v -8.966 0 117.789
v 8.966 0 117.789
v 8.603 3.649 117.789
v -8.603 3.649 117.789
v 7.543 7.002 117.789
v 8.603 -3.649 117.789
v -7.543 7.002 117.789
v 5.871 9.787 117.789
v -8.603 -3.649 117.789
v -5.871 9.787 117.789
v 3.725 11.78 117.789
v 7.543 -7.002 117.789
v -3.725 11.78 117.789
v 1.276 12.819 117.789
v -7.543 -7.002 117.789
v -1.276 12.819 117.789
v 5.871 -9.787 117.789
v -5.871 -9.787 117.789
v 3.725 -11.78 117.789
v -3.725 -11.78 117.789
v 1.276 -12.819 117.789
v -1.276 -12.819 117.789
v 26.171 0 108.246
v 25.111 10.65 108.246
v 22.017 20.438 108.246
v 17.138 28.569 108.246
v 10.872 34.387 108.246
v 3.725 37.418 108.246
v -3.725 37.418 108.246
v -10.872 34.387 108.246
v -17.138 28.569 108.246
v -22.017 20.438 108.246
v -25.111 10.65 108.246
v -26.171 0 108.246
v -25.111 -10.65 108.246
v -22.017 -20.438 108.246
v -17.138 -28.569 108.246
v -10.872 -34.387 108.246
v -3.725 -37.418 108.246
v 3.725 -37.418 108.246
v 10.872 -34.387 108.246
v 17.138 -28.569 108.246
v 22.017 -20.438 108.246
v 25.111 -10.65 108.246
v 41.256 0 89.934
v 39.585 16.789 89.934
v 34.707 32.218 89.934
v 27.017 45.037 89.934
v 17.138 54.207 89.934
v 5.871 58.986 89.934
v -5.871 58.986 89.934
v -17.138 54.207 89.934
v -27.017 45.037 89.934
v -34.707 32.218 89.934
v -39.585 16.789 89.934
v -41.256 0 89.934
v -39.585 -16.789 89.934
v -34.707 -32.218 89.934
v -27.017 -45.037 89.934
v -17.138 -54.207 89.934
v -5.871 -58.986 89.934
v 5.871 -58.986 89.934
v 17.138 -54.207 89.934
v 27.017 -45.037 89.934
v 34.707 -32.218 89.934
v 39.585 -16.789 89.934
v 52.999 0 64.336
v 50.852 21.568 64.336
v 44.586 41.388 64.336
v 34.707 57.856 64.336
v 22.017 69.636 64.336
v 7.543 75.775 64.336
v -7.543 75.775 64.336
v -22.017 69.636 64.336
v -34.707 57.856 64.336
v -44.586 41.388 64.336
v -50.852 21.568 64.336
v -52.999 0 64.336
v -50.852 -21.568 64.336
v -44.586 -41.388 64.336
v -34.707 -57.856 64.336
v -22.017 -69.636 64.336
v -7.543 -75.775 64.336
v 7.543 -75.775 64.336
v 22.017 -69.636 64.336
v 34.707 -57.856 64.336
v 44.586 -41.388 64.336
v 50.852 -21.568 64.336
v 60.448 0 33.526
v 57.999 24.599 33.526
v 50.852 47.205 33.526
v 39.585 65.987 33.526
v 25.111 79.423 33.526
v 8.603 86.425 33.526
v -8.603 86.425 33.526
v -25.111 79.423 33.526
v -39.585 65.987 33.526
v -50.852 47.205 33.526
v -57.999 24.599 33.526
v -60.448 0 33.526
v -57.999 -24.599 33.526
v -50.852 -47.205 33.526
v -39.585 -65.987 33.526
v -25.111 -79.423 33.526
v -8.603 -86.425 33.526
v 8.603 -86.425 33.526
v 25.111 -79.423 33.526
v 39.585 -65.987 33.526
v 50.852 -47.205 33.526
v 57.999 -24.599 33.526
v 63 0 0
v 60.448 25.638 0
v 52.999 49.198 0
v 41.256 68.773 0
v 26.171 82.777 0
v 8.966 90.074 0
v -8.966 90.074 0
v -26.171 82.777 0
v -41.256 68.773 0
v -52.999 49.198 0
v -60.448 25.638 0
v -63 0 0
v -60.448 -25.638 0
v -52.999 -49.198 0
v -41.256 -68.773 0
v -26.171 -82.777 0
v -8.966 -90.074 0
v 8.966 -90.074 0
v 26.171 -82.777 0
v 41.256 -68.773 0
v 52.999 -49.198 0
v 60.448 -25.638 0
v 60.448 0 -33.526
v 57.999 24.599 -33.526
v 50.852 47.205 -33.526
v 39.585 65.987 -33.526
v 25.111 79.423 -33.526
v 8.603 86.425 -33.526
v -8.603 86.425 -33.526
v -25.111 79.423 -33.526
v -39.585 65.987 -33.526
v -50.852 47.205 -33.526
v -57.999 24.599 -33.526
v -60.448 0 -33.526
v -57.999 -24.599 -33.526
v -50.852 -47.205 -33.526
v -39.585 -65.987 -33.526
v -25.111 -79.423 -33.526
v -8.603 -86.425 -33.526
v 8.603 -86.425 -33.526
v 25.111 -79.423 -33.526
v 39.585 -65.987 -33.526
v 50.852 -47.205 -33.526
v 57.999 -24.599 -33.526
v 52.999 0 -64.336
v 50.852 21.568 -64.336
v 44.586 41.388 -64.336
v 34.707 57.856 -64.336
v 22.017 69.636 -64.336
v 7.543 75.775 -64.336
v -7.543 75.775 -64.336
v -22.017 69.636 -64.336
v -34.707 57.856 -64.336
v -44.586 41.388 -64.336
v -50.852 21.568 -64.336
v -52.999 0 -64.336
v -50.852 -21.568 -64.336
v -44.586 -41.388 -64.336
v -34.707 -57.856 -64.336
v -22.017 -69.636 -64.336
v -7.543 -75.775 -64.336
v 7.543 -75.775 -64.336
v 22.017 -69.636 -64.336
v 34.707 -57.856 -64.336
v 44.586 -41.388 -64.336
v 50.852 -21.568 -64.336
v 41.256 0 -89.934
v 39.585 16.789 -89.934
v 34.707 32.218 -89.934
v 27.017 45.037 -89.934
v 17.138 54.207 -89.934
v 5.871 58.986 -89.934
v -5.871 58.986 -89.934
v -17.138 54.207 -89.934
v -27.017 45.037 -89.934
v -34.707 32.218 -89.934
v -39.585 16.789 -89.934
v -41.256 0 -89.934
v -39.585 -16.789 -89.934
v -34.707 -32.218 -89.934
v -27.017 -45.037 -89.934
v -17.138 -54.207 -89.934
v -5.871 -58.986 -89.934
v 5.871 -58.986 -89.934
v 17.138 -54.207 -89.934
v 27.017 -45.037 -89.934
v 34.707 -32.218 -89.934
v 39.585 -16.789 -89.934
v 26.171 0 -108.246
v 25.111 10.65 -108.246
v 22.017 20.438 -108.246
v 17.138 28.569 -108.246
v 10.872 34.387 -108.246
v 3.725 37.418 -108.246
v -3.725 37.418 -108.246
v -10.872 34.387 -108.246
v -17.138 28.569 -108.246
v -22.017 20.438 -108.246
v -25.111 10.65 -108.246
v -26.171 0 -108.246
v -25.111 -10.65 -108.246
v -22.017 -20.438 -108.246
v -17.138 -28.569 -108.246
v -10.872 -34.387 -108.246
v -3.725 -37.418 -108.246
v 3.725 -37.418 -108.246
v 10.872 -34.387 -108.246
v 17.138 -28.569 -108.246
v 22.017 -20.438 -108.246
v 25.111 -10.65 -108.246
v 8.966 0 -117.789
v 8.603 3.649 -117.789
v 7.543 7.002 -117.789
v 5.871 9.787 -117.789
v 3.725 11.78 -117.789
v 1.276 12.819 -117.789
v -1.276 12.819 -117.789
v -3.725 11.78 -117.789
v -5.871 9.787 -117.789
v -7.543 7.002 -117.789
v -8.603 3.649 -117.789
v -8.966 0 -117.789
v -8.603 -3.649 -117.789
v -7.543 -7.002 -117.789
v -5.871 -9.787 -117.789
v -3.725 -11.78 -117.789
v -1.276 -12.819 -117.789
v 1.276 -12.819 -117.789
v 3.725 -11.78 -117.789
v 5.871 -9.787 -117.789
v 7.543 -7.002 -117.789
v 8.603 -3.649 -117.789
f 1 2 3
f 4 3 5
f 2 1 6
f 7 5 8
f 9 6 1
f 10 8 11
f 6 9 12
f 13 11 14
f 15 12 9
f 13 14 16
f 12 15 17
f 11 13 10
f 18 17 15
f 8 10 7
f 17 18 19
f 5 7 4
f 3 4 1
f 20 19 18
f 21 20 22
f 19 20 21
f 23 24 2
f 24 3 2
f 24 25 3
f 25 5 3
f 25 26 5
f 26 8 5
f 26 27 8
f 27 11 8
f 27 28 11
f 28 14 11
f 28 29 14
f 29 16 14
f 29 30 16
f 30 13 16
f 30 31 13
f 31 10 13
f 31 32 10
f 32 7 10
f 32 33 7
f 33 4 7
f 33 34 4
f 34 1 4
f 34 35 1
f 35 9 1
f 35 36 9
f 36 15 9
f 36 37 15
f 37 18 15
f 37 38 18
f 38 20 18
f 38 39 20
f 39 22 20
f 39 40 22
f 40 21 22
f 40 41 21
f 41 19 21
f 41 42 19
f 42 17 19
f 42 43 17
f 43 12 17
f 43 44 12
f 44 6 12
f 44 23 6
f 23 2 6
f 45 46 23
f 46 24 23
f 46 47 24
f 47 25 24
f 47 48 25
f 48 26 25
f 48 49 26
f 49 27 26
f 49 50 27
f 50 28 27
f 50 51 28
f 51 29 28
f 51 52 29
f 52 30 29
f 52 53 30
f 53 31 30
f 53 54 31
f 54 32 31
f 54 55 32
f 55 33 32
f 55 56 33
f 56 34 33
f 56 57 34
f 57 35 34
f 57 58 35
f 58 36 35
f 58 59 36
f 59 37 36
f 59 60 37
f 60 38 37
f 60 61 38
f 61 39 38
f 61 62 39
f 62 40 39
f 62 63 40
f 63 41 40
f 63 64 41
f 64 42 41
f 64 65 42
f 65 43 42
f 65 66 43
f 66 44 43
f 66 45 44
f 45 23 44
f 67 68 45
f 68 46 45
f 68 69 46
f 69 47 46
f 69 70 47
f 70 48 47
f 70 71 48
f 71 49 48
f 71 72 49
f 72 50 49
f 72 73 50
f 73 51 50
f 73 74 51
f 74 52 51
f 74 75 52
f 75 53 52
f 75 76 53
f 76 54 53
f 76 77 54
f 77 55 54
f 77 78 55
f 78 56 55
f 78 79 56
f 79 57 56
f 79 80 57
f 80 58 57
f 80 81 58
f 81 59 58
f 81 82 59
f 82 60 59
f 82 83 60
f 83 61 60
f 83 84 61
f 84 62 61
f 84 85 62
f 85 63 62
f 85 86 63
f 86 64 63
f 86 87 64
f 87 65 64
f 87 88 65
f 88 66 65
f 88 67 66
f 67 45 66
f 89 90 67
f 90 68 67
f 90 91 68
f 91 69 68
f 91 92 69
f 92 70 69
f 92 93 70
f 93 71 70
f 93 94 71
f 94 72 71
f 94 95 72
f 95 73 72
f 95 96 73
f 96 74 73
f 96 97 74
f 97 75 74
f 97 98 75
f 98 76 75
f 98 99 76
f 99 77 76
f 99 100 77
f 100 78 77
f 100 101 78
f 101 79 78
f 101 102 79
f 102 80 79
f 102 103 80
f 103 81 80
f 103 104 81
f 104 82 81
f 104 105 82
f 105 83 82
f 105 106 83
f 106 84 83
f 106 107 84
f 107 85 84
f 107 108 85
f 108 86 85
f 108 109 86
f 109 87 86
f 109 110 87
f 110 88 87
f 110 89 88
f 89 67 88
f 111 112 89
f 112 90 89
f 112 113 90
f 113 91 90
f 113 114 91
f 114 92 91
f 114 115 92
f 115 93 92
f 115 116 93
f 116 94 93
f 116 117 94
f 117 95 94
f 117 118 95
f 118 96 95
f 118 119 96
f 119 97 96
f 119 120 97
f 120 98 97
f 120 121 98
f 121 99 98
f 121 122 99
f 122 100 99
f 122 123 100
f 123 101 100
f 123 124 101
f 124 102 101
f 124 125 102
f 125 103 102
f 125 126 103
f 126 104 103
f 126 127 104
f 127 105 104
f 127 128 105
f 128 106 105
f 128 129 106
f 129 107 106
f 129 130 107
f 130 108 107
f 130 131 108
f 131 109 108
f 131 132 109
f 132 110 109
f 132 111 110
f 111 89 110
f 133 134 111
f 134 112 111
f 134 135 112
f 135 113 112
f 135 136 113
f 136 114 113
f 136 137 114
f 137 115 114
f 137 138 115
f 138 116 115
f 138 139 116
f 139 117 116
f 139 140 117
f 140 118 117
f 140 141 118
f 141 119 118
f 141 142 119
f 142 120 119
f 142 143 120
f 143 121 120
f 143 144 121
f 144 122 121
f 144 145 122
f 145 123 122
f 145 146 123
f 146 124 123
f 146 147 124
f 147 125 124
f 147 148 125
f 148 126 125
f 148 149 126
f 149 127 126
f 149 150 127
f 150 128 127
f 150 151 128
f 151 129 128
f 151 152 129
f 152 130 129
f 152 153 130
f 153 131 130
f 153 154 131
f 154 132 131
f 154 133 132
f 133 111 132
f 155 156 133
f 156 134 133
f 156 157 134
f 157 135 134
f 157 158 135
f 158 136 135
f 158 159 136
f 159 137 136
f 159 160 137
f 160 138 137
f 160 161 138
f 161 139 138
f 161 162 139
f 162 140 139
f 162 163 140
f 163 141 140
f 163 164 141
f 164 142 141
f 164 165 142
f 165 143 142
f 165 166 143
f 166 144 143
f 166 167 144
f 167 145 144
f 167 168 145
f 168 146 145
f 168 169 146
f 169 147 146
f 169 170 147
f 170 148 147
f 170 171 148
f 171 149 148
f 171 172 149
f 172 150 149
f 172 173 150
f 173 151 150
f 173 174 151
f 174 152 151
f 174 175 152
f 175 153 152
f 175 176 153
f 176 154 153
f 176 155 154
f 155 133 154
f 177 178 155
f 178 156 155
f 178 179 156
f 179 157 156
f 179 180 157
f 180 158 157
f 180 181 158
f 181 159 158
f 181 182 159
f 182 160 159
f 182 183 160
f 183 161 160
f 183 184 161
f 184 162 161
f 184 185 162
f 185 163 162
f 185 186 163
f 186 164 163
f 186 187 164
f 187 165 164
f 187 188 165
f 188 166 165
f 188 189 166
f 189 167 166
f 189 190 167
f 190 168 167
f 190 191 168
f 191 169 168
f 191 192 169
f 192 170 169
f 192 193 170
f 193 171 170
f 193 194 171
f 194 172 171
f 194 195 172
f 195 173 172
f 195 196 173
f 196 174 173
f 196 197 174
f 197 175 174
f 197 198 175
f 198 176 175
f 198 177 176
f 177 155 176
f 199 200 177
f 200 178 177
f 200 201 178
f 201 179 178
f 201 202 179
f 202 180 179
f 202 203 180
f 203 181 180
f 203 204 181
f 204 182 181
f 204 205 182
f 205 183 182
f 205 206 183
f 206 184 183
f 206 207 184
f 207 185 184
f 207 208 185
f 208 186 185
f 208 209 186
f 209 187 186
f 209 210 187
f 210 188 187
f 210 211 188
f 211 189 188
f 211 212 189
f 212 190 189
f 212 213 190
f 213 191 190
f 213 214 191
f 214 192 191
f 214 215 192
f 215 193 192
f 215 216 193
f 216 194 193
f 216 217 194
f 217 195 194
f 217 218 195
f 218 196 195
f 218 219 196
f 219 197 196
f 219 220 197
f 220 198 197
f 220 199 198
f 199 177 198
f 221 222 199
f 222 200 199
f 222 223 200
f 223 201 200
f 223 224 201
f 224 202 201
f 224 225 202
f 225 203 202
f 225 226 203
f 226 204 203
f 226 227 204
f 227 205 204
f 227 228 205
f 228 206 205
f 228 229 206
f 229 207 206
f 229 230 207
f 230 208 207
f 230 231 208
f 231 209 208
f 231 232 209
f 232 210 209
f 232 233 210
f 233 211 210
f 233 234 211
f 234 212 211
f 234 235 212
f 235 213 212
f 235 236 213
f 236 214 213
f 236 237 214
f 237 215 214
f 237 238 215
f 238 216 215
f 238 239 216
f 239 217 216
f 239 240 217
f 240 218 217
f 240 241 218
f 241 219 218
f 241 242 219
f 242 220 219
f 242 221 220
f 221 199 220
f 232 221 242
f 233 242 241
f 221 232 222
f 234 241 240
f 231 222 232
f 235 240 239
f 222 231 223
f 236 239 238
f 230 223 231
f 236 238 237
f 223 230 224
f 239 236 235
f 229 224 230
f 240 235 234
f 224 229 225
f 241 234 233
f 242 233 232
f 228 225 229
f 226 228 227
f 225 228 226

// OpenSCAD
// Generated by SolidPython 1.0.1 on 2020-07-29 00:46:49


scale(v = [9, 13, 17]) {
	sphere(r = 7);
}
/***********************************************
*********      SolidPython code:      **********
************************************************
 
# import packages: SolidPython
from solid import *
from solid.utils import *
from itertools import chain, combinations, permutations


class Resize:

    def __init__(self, scad_file):
        self.scad_file = scad_file
        #self.scad_file = import_scad(scad_file)
        # cone/cylinder param:
        self.r1 = 0
        self.r2 = 0
        self.h = 0
        # rectangular prism param:
        self.w = 0
        self.l = 0
        # ellipse param:
        self.r = 0

    # import OpenScad code (file name corresponds to shape)


    # classify shape + parameters
    def assign(self, param1, param2, param3):
        if self.scad_file == 'cone.scad':
            self.r1 = param1
            self.r2 = param2
            self.h = param3
        elif self.scad_file == 'cylinder.scad':
            self.r1 = param1
            self.r2 = param2
            self.h = param3
        elif self.scad_file == 'rectangularPrism.scad':
            self.h = param1
            self.l = param2
            self.w = param3
        else:
            self.r = param1
            self.h = param2

    # resize parameters
    def iterate(self):
        x = range(3, 20, 2)
        i = 1
        if self.scad_file == 'cone.scad':
            tempList = list(permutations(x, 2))
            for temp in tempList:
                param1 = temp[0]
                param2 = temp[1]
                filepath = 'produced_scad_files/' + 'cone' + str(param1) + '_' + str(param2) + '_' + '.scad'
                scad_render_to_file(cylinder(h=param1, r1=param2, r2=0), filepath)

        elif self.scad_file == 'cylinder.scad':
            tempList = list(permutations(x, 3))
            for temp in tempList:
                param1 = temp[0]
                param2 = temp[1]
                filepath = 'produced_scad_files/' + 'cylinder' + str(param1) + '_' + str(param2) + '_' + '.scad'
                scad_render_to_file(cylinder(h=param1, r1=param2, r2=param2), filepath)

        elif self.scad_file == 'rectangularPrism.scad':
            tempList = list(permutations(x, 3))
            for temp in tempList:
                param1 = temp[0]
                param2 = temp[1]
                param3 = temp[2]
                filepath = 'produced_scad_files/' + 'rectangularPrism' + str(param1) + '_' + str(param2) + '_' + str(
                    param3) + '.scad'
                scad_render_to_file(cube(size=(param1, param2, param3)), filepath)

        elif self.scad_file == 'ellipse.scad':
            tempList = list(permutations(x, 4))
            for temp in tempList:
                param1 = temp[0]
                param2 = temp[1]
                param3 = temp[2]
                param4 = temp[3]
                filepath = 'produced_scad_files/' + 'ellipse' + str(param1) + '_' + str(param2) + '_' + str(param3) + '_' + str(param4) + '.scad'
                scad_render_to_file(scale([param1, param2, param3])(sphere(r=param4)), filepath)

    def render_to_scadfile(self):
        scad_render_to_file(scad, 'example.scad') 
 
************************************************/
